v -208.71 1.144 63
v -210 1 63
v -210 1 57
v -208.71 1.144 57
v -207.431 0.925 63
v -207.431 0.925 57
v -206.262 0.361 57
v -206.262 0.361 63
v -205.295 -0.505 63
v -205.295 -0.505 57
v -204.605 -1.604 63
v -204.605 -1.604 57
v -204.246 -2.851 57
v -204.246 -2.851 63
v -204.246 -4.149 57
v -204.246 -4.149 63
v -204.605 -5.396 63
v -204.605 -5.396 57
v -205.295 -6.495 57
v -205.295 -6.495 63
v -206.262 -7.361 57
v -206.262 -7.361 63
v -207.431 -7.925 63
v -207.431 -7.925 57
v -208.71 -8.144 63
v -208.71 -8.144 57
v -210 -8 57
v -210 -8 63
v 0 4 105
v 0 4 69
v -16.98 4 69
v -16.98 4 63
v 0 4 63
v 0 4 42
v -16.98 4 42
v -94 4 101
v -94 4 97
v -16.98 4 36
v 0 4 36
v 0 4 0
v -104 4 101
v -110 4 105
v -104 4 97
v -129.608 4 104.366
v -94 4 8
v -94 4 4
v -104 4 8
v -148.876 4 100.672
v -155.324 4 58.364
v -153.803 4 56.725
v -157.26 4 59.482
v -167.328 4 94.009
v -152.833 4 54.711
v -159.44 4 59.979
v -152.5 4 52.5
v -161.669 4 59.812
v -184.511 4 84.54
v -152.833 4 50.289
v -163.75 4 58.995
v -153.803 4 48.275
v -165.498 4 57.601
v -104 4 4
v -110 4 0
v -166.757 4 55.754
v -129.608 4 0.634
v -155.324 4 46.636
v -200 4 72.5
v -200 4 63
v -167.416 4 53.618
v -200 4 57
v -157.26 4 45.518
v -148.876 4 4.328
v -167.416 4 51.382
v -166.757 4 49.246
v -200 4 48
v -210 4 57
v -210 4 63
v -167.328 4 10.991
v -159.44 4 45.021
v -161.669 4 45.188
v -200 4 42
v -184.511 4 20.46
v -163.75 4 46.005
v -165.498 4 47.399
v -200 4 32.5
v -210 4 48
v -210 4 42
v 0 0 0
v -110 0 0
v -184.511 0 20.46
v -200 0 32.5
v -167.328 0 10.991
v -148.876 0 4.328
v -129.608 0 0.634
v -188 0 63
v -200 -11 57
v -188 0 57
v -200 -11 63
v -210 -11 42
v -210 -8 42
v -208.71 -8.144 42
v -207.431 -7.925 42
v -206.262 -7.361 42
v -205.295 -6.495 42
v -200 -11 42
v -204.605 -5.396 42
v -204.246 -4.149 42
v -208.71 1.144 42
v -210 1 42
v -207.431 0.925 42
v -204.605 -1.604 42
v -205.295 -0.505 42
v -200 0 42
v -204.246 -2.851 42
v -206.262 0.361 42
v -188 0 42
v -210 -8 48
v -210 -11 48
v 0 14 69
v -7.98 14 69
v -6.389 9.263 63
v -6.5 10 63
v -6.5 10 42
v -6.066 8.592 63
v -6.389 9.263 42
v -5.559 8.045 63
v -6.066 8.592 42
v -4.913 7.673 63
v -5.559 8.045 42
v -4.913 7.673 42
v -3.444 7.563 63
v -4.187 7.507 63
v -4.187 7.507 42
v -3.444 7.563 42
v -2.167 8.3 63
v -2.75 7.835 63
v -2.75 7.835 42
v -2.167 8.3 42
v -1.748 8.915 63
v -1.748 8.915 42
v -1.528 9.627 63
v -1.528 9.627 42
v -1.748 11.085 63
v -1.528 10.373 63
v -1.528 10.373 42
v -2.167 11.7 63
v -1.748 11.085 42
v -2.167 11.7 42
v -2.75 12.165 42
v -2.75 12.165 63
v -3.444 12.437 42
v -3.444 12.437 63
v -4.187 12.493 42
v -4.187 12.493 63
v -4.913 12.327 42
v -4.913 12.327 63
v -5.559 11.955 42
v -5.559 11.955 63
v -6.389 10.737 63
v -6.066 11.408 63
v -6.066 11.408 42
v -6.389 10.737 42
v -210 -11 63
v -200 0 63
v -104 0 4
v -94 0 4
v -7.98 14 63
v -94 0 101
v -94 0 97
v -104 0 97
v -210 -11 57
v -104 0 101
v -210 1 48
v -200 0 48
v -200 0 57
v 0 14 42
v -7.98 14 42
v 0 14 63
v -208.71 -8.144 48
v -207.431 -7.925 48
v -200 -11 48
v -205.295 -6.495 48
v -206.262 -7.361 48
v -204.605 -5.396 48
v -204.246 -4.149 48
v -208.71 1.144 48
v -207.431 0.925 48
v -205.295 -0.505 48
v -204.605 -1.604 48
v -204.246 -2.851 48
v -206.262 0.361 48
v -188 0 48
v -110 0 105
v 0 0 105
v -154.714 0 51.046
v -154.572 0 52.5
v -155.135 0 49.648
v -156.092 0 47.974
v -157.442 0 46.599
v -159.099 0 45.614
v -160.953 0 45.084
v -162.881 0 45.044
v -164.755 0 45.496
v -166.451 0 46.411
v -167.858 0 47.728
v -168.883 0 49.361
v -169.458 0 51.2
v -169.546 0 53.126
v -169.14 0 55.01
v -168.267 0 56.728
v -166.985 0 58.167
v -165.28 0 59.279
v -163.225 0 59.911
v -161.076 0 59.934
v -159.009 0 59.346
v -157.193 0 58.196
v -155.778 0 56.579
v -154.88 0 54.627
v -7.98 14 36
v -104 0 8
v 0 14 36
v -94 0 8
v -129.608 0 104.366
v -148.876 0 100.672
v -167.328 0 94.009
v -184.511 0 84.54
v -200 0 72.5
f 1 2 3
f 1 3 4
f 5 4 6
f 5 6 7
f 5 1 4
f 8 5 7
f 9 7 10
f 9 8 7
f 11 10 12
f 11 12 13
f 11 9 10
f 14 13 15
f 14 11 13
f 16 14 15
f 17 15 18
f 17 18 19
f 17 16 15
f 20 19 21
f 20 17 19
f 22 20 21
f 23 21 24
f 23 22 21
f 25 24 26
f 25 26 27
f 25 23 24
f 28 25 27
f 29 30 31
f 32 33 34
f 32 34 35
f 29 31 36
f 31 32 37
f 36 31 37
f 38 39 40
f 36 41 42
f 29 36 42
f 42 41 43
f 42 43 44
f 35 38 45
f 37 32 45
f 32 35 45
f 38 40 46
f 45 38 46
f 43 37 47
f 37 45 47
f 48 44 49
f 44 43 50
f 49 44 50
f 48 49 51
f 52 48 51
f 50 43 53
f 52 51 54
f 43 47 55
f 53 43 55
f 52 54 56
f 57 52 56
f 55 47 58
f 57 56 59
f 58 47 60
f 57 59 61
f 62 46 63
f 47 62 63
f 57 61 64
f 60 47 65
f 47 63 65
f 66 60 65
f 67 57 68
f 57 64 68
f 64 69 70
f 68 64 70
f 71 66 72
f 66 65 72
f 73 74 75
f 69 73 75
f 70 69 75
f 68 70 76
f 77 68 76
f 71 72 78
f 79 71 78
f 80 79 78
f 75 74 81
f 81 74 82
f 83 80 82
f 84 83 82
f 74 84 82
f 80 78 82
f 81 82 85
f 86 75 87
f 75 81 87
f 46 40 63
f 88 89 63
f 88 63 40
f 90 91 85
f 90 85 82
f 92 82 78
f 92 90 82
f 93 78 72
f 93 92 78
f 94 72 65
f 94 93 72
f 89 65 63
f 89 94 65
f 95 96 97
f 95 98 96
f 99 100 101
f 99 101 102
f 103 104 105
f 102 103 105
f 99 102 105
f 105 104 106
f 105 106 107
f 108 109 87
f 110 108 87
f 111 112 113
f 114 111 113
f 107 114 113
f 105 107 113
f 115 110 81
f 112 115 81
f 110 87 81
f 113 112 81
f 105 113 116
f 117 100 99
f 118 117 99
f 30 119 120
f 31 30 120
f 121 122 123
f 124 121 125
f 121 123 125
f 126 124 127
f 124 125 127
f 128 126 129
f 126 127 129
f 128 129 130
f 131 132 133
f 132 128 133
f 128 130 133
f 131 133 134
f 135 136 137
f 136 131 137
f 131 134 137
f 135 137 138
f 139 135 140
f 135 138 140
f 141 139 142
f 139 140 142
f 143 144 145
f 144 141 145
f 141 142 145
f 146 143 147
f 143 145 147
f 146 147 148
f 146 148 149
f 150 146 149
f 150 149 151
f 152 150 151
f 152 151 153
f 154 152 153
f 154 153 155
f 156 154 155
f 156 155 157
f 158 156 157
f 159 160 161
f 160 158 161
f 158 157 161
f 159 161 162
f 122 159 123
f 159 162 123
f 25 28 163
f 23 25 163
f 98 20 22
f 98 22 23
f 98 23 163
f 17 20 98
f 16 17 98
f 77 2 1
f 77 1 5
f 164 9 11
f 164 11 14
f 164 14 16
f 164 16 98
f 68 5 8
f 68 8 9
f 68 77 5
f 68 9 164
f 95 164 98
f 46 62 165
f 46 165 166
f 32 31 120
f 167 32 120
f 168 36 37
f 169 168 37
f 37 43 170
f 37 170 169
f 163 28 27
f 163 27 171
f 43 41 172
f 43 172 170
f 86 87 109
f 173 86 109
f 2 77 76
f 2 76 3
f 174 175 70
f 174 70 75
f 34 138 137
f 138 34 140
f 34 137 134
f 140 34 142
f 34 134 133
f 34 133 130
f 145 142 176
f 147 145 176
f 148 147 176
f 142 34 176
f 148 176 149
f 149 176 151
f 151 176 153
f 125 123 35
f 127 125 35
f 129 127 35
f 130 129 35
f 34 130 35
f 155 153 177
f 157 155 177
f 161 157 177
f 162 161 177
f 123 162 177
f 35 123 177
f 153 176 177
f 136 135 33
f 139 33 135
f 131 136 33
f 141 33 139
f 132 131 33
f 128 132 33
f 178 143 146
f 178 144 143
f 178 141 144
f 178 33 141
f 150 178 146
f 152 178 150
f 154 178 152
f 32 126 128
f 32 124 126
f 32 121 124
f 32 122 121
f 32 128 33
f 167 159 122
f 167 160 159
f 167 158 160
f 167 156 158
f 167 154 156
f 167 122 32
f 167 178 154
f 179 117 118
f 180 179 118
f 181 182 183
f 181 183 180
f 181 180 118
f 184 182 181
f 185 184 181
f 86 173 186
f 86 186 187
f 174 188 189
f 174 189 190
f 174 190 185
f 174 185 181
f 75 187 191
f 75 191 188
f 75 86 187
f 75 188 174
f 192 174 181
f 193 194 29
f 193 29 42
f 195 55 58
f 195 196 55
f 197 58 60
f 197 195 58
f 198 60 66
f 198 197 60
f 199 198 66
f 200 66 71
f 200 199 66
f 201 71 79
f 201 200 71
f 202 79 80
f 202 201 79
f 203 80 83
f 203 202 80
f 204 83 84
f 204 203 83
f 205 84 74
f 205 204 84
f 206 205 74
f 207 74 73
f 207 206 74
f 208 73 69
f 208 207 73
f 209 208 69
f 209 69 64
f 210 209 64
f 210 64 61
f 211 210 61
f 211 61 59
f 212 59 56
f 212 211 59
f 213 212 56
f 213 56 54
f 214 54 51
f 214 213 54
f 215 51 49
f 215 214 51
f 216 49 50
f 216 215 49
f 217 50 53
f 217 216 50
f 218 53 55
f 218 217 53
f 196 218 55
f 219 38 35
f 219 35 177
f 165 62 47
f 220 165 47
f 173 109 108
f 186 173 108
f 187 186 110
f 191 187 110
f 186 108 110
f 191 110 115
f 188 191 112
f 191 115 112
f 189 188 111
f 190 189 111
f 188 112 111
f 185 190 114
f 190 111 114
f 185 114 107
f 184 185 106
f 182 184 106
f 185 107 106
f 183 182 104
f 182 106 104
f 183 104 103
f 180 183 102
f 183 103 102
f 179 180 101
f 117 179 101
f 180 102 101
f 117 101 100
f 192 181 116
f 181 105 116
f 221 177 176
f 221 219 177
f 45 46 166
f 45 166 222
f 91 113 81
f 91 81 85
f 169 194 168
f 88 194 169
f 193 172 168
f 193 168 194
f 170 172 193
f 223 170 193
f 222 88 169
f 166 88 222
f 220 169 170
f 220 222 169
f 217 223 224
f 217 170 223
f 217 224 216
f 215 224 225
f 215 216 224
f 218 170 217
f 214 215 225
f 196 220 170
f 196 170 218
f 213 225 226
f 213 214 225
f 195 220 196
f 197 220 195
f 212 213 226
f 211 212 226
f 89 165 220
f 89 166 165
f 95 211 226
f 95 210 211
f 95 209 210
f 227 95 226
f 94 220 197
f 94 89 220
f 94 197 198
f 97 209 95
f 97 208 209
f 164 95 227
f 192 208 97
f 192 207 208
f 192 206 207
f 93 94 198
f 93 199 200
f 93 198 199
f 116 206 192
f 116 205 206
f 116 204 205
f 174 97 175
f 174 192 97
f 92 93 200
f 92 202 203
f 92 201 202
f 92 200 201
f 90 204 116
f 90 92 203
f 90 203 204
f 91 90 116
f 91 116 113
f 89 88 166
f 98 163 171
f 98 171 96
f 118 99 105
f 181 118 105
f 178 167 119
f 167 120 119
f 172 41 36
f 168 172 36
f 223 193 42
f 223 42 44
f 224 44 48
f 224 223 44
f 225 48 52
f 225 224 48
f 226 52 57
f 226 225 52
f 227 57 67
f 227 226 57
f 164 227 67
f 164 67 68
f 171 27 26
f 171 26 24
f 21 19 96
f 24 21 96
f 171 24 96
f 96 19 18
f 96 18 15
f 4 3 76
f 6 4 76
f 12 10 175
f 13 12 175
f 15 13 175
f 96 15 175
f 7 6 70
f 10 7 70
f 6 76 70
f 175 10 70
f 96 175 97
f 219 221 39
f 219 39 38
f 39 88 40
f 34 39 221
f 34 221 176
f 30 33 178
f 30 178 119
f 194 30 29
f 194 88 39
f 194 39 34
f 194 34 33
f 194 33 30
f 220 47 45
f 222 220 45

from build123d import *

# Parameters (mm, degrees)
BOSS_EXTRUDE1_DEPTH = 4
BOSS_EXTRUDE2_START = -45
BOSS_EXTRUDE2_DEPTH = 3
BOSS_EXTRUDE3_START = -39
BOSS_EXTRUDE3_DEPTH = 3
BOSS_EXTRUDE4_REACH = 221.731
SKETCH6_R           = 2.5
SKETCH7_W           = 10
SKETCH7_H           = 4
CUT_EXTRUDE1_DEPTH  = 10
SKETCH8_R           = 7.5


with BuildPart() as part:
    # Sketch1 → Boss-Extrude1 (new body)
    with BuildSketch(Plane(origin=(0, 0, 0), x_dir=(1, 0, 0), z_dir=(0, 1, 0))):
        with BuildLine():
            Line((-110, 0), (0, 0))
            Line((0, 0), (0, -105))
            Line((0, -105), (-110, -105))
            ThreePointArc((-110, -105), (-158.232963684, -97.702822508), (-200, -72.5))
            Line((-200, -72.5), (-200, -32.5))
            ThreePointArc((-200, -32.5), (-158.232963684, -7.297177492), (-110, 0))
        make_face()
    extrude(amount=BOSS_EXTRUDE1_DEPTH)

    # Sketch2 → Boss-Extrude2 (add, symmetric)
    with BuildSketch(Plane.XY.offset(105).offset(BOSS_EXTRUDE2_START)):
        with BuildLine():
            Line((-200, 4), (-210, 4))
            Line((-210, 4), (-210, 1))
            ThreePointArc((-210, 1), (-204.2, -3.5), (-210, -8))
            Line((-210, -8), (-210, -11))
            Line((-210, -11), (-200, -11))
            Line((-200, -11), (-188, 0))
            Line((-188, 0), (-200, 4))
        make_face()
    boss_extrude2 = extrude(amount=BOSS_EXTRUDE2_DEPTH, both=True)

    # Mirror1: Boss-Extrude2 across plane
    add(boss_extrude2.mirror(Plane.XY.offset(52.5)))

    # Sketch5 → Boss-Extrude3 (add, symmetric)
    with BuildSketch(Plane.XY.offset(105).offset(BOSS_EXTRUDE3_START)):
        Polygon((-16.979807258, 4), (-7.979807258, 14), (0, 14), (0, 4), align=None)
    boss_extrude3 = extrude(amount=BOSS_EXTRUDE3_DEPTH, both=True)

    # Mirror4: Boss-Extrude3 across plane
    add(boss_extrude3.mirror(Plane.XY.offset(52.5)))

    # Sketch6 → Boss-Extrude4 (add, up to next)
    with BuildSketch(Plane.XY.offset(42), mode=Mode.PRIVATE) as boss_extrude4_sk1:
        with Locations(Location((-4, 10, 0), (0, 0, 180))):
            Circle(SKETCH6_R)
    boss_extrude4_tool1 = extrude(boss_extrude4_sk1.sketch, amount=BOSS_EXTRUDE4_REACH, mode=Mode.PRIVATE) - part.part
    add(boss_extrude4_tool1.solids().sort_by_distance((-4, 10, 42))[0])

    # Sketch7 → Cut-Extrude1 (cut)
    with BuildSketch(Plane(origin=(0, 4, 0), x_dir=(1, 0, 0), z_dir=(0, 1, 0))):
        with Locations((-99, -99)):
            Rectangle(SKETCH7_W, SKETCH7_H)
    cut_extrude1 = extrude(amount=-CUT_EXTRUDE1_DEPTH, mode=Mode.SUBTRACT)

    # Mirror5: Cut-Extrude1 across plane
    add(cut_extrude1.mirror(Plane.XY.offset(52.5)), mode=Mode.SUBTRACT)

    # Cut-Sweep1: sweep along a path in Sketch9
    with BuildLine(Plane.XY.offset(52.5)) as cut_sweep1_path:
        Line((-160, 4), (-163.867437875, -3.466183031))
    # Sketch8 → Cut-Sweep1 (sweep, cut)
    with BuildSketch(Plane(origin=(0, 4, 0), x_dir=(1, 0, 0), z_dir=(0, 1, 0))):
        with Locations((-160, -52.5)):
            Circle(SKETCH8_R)
    sweep(path=cut_sweep1_path.line, mode=Mode.SUBTRACT)


solid = part.part
